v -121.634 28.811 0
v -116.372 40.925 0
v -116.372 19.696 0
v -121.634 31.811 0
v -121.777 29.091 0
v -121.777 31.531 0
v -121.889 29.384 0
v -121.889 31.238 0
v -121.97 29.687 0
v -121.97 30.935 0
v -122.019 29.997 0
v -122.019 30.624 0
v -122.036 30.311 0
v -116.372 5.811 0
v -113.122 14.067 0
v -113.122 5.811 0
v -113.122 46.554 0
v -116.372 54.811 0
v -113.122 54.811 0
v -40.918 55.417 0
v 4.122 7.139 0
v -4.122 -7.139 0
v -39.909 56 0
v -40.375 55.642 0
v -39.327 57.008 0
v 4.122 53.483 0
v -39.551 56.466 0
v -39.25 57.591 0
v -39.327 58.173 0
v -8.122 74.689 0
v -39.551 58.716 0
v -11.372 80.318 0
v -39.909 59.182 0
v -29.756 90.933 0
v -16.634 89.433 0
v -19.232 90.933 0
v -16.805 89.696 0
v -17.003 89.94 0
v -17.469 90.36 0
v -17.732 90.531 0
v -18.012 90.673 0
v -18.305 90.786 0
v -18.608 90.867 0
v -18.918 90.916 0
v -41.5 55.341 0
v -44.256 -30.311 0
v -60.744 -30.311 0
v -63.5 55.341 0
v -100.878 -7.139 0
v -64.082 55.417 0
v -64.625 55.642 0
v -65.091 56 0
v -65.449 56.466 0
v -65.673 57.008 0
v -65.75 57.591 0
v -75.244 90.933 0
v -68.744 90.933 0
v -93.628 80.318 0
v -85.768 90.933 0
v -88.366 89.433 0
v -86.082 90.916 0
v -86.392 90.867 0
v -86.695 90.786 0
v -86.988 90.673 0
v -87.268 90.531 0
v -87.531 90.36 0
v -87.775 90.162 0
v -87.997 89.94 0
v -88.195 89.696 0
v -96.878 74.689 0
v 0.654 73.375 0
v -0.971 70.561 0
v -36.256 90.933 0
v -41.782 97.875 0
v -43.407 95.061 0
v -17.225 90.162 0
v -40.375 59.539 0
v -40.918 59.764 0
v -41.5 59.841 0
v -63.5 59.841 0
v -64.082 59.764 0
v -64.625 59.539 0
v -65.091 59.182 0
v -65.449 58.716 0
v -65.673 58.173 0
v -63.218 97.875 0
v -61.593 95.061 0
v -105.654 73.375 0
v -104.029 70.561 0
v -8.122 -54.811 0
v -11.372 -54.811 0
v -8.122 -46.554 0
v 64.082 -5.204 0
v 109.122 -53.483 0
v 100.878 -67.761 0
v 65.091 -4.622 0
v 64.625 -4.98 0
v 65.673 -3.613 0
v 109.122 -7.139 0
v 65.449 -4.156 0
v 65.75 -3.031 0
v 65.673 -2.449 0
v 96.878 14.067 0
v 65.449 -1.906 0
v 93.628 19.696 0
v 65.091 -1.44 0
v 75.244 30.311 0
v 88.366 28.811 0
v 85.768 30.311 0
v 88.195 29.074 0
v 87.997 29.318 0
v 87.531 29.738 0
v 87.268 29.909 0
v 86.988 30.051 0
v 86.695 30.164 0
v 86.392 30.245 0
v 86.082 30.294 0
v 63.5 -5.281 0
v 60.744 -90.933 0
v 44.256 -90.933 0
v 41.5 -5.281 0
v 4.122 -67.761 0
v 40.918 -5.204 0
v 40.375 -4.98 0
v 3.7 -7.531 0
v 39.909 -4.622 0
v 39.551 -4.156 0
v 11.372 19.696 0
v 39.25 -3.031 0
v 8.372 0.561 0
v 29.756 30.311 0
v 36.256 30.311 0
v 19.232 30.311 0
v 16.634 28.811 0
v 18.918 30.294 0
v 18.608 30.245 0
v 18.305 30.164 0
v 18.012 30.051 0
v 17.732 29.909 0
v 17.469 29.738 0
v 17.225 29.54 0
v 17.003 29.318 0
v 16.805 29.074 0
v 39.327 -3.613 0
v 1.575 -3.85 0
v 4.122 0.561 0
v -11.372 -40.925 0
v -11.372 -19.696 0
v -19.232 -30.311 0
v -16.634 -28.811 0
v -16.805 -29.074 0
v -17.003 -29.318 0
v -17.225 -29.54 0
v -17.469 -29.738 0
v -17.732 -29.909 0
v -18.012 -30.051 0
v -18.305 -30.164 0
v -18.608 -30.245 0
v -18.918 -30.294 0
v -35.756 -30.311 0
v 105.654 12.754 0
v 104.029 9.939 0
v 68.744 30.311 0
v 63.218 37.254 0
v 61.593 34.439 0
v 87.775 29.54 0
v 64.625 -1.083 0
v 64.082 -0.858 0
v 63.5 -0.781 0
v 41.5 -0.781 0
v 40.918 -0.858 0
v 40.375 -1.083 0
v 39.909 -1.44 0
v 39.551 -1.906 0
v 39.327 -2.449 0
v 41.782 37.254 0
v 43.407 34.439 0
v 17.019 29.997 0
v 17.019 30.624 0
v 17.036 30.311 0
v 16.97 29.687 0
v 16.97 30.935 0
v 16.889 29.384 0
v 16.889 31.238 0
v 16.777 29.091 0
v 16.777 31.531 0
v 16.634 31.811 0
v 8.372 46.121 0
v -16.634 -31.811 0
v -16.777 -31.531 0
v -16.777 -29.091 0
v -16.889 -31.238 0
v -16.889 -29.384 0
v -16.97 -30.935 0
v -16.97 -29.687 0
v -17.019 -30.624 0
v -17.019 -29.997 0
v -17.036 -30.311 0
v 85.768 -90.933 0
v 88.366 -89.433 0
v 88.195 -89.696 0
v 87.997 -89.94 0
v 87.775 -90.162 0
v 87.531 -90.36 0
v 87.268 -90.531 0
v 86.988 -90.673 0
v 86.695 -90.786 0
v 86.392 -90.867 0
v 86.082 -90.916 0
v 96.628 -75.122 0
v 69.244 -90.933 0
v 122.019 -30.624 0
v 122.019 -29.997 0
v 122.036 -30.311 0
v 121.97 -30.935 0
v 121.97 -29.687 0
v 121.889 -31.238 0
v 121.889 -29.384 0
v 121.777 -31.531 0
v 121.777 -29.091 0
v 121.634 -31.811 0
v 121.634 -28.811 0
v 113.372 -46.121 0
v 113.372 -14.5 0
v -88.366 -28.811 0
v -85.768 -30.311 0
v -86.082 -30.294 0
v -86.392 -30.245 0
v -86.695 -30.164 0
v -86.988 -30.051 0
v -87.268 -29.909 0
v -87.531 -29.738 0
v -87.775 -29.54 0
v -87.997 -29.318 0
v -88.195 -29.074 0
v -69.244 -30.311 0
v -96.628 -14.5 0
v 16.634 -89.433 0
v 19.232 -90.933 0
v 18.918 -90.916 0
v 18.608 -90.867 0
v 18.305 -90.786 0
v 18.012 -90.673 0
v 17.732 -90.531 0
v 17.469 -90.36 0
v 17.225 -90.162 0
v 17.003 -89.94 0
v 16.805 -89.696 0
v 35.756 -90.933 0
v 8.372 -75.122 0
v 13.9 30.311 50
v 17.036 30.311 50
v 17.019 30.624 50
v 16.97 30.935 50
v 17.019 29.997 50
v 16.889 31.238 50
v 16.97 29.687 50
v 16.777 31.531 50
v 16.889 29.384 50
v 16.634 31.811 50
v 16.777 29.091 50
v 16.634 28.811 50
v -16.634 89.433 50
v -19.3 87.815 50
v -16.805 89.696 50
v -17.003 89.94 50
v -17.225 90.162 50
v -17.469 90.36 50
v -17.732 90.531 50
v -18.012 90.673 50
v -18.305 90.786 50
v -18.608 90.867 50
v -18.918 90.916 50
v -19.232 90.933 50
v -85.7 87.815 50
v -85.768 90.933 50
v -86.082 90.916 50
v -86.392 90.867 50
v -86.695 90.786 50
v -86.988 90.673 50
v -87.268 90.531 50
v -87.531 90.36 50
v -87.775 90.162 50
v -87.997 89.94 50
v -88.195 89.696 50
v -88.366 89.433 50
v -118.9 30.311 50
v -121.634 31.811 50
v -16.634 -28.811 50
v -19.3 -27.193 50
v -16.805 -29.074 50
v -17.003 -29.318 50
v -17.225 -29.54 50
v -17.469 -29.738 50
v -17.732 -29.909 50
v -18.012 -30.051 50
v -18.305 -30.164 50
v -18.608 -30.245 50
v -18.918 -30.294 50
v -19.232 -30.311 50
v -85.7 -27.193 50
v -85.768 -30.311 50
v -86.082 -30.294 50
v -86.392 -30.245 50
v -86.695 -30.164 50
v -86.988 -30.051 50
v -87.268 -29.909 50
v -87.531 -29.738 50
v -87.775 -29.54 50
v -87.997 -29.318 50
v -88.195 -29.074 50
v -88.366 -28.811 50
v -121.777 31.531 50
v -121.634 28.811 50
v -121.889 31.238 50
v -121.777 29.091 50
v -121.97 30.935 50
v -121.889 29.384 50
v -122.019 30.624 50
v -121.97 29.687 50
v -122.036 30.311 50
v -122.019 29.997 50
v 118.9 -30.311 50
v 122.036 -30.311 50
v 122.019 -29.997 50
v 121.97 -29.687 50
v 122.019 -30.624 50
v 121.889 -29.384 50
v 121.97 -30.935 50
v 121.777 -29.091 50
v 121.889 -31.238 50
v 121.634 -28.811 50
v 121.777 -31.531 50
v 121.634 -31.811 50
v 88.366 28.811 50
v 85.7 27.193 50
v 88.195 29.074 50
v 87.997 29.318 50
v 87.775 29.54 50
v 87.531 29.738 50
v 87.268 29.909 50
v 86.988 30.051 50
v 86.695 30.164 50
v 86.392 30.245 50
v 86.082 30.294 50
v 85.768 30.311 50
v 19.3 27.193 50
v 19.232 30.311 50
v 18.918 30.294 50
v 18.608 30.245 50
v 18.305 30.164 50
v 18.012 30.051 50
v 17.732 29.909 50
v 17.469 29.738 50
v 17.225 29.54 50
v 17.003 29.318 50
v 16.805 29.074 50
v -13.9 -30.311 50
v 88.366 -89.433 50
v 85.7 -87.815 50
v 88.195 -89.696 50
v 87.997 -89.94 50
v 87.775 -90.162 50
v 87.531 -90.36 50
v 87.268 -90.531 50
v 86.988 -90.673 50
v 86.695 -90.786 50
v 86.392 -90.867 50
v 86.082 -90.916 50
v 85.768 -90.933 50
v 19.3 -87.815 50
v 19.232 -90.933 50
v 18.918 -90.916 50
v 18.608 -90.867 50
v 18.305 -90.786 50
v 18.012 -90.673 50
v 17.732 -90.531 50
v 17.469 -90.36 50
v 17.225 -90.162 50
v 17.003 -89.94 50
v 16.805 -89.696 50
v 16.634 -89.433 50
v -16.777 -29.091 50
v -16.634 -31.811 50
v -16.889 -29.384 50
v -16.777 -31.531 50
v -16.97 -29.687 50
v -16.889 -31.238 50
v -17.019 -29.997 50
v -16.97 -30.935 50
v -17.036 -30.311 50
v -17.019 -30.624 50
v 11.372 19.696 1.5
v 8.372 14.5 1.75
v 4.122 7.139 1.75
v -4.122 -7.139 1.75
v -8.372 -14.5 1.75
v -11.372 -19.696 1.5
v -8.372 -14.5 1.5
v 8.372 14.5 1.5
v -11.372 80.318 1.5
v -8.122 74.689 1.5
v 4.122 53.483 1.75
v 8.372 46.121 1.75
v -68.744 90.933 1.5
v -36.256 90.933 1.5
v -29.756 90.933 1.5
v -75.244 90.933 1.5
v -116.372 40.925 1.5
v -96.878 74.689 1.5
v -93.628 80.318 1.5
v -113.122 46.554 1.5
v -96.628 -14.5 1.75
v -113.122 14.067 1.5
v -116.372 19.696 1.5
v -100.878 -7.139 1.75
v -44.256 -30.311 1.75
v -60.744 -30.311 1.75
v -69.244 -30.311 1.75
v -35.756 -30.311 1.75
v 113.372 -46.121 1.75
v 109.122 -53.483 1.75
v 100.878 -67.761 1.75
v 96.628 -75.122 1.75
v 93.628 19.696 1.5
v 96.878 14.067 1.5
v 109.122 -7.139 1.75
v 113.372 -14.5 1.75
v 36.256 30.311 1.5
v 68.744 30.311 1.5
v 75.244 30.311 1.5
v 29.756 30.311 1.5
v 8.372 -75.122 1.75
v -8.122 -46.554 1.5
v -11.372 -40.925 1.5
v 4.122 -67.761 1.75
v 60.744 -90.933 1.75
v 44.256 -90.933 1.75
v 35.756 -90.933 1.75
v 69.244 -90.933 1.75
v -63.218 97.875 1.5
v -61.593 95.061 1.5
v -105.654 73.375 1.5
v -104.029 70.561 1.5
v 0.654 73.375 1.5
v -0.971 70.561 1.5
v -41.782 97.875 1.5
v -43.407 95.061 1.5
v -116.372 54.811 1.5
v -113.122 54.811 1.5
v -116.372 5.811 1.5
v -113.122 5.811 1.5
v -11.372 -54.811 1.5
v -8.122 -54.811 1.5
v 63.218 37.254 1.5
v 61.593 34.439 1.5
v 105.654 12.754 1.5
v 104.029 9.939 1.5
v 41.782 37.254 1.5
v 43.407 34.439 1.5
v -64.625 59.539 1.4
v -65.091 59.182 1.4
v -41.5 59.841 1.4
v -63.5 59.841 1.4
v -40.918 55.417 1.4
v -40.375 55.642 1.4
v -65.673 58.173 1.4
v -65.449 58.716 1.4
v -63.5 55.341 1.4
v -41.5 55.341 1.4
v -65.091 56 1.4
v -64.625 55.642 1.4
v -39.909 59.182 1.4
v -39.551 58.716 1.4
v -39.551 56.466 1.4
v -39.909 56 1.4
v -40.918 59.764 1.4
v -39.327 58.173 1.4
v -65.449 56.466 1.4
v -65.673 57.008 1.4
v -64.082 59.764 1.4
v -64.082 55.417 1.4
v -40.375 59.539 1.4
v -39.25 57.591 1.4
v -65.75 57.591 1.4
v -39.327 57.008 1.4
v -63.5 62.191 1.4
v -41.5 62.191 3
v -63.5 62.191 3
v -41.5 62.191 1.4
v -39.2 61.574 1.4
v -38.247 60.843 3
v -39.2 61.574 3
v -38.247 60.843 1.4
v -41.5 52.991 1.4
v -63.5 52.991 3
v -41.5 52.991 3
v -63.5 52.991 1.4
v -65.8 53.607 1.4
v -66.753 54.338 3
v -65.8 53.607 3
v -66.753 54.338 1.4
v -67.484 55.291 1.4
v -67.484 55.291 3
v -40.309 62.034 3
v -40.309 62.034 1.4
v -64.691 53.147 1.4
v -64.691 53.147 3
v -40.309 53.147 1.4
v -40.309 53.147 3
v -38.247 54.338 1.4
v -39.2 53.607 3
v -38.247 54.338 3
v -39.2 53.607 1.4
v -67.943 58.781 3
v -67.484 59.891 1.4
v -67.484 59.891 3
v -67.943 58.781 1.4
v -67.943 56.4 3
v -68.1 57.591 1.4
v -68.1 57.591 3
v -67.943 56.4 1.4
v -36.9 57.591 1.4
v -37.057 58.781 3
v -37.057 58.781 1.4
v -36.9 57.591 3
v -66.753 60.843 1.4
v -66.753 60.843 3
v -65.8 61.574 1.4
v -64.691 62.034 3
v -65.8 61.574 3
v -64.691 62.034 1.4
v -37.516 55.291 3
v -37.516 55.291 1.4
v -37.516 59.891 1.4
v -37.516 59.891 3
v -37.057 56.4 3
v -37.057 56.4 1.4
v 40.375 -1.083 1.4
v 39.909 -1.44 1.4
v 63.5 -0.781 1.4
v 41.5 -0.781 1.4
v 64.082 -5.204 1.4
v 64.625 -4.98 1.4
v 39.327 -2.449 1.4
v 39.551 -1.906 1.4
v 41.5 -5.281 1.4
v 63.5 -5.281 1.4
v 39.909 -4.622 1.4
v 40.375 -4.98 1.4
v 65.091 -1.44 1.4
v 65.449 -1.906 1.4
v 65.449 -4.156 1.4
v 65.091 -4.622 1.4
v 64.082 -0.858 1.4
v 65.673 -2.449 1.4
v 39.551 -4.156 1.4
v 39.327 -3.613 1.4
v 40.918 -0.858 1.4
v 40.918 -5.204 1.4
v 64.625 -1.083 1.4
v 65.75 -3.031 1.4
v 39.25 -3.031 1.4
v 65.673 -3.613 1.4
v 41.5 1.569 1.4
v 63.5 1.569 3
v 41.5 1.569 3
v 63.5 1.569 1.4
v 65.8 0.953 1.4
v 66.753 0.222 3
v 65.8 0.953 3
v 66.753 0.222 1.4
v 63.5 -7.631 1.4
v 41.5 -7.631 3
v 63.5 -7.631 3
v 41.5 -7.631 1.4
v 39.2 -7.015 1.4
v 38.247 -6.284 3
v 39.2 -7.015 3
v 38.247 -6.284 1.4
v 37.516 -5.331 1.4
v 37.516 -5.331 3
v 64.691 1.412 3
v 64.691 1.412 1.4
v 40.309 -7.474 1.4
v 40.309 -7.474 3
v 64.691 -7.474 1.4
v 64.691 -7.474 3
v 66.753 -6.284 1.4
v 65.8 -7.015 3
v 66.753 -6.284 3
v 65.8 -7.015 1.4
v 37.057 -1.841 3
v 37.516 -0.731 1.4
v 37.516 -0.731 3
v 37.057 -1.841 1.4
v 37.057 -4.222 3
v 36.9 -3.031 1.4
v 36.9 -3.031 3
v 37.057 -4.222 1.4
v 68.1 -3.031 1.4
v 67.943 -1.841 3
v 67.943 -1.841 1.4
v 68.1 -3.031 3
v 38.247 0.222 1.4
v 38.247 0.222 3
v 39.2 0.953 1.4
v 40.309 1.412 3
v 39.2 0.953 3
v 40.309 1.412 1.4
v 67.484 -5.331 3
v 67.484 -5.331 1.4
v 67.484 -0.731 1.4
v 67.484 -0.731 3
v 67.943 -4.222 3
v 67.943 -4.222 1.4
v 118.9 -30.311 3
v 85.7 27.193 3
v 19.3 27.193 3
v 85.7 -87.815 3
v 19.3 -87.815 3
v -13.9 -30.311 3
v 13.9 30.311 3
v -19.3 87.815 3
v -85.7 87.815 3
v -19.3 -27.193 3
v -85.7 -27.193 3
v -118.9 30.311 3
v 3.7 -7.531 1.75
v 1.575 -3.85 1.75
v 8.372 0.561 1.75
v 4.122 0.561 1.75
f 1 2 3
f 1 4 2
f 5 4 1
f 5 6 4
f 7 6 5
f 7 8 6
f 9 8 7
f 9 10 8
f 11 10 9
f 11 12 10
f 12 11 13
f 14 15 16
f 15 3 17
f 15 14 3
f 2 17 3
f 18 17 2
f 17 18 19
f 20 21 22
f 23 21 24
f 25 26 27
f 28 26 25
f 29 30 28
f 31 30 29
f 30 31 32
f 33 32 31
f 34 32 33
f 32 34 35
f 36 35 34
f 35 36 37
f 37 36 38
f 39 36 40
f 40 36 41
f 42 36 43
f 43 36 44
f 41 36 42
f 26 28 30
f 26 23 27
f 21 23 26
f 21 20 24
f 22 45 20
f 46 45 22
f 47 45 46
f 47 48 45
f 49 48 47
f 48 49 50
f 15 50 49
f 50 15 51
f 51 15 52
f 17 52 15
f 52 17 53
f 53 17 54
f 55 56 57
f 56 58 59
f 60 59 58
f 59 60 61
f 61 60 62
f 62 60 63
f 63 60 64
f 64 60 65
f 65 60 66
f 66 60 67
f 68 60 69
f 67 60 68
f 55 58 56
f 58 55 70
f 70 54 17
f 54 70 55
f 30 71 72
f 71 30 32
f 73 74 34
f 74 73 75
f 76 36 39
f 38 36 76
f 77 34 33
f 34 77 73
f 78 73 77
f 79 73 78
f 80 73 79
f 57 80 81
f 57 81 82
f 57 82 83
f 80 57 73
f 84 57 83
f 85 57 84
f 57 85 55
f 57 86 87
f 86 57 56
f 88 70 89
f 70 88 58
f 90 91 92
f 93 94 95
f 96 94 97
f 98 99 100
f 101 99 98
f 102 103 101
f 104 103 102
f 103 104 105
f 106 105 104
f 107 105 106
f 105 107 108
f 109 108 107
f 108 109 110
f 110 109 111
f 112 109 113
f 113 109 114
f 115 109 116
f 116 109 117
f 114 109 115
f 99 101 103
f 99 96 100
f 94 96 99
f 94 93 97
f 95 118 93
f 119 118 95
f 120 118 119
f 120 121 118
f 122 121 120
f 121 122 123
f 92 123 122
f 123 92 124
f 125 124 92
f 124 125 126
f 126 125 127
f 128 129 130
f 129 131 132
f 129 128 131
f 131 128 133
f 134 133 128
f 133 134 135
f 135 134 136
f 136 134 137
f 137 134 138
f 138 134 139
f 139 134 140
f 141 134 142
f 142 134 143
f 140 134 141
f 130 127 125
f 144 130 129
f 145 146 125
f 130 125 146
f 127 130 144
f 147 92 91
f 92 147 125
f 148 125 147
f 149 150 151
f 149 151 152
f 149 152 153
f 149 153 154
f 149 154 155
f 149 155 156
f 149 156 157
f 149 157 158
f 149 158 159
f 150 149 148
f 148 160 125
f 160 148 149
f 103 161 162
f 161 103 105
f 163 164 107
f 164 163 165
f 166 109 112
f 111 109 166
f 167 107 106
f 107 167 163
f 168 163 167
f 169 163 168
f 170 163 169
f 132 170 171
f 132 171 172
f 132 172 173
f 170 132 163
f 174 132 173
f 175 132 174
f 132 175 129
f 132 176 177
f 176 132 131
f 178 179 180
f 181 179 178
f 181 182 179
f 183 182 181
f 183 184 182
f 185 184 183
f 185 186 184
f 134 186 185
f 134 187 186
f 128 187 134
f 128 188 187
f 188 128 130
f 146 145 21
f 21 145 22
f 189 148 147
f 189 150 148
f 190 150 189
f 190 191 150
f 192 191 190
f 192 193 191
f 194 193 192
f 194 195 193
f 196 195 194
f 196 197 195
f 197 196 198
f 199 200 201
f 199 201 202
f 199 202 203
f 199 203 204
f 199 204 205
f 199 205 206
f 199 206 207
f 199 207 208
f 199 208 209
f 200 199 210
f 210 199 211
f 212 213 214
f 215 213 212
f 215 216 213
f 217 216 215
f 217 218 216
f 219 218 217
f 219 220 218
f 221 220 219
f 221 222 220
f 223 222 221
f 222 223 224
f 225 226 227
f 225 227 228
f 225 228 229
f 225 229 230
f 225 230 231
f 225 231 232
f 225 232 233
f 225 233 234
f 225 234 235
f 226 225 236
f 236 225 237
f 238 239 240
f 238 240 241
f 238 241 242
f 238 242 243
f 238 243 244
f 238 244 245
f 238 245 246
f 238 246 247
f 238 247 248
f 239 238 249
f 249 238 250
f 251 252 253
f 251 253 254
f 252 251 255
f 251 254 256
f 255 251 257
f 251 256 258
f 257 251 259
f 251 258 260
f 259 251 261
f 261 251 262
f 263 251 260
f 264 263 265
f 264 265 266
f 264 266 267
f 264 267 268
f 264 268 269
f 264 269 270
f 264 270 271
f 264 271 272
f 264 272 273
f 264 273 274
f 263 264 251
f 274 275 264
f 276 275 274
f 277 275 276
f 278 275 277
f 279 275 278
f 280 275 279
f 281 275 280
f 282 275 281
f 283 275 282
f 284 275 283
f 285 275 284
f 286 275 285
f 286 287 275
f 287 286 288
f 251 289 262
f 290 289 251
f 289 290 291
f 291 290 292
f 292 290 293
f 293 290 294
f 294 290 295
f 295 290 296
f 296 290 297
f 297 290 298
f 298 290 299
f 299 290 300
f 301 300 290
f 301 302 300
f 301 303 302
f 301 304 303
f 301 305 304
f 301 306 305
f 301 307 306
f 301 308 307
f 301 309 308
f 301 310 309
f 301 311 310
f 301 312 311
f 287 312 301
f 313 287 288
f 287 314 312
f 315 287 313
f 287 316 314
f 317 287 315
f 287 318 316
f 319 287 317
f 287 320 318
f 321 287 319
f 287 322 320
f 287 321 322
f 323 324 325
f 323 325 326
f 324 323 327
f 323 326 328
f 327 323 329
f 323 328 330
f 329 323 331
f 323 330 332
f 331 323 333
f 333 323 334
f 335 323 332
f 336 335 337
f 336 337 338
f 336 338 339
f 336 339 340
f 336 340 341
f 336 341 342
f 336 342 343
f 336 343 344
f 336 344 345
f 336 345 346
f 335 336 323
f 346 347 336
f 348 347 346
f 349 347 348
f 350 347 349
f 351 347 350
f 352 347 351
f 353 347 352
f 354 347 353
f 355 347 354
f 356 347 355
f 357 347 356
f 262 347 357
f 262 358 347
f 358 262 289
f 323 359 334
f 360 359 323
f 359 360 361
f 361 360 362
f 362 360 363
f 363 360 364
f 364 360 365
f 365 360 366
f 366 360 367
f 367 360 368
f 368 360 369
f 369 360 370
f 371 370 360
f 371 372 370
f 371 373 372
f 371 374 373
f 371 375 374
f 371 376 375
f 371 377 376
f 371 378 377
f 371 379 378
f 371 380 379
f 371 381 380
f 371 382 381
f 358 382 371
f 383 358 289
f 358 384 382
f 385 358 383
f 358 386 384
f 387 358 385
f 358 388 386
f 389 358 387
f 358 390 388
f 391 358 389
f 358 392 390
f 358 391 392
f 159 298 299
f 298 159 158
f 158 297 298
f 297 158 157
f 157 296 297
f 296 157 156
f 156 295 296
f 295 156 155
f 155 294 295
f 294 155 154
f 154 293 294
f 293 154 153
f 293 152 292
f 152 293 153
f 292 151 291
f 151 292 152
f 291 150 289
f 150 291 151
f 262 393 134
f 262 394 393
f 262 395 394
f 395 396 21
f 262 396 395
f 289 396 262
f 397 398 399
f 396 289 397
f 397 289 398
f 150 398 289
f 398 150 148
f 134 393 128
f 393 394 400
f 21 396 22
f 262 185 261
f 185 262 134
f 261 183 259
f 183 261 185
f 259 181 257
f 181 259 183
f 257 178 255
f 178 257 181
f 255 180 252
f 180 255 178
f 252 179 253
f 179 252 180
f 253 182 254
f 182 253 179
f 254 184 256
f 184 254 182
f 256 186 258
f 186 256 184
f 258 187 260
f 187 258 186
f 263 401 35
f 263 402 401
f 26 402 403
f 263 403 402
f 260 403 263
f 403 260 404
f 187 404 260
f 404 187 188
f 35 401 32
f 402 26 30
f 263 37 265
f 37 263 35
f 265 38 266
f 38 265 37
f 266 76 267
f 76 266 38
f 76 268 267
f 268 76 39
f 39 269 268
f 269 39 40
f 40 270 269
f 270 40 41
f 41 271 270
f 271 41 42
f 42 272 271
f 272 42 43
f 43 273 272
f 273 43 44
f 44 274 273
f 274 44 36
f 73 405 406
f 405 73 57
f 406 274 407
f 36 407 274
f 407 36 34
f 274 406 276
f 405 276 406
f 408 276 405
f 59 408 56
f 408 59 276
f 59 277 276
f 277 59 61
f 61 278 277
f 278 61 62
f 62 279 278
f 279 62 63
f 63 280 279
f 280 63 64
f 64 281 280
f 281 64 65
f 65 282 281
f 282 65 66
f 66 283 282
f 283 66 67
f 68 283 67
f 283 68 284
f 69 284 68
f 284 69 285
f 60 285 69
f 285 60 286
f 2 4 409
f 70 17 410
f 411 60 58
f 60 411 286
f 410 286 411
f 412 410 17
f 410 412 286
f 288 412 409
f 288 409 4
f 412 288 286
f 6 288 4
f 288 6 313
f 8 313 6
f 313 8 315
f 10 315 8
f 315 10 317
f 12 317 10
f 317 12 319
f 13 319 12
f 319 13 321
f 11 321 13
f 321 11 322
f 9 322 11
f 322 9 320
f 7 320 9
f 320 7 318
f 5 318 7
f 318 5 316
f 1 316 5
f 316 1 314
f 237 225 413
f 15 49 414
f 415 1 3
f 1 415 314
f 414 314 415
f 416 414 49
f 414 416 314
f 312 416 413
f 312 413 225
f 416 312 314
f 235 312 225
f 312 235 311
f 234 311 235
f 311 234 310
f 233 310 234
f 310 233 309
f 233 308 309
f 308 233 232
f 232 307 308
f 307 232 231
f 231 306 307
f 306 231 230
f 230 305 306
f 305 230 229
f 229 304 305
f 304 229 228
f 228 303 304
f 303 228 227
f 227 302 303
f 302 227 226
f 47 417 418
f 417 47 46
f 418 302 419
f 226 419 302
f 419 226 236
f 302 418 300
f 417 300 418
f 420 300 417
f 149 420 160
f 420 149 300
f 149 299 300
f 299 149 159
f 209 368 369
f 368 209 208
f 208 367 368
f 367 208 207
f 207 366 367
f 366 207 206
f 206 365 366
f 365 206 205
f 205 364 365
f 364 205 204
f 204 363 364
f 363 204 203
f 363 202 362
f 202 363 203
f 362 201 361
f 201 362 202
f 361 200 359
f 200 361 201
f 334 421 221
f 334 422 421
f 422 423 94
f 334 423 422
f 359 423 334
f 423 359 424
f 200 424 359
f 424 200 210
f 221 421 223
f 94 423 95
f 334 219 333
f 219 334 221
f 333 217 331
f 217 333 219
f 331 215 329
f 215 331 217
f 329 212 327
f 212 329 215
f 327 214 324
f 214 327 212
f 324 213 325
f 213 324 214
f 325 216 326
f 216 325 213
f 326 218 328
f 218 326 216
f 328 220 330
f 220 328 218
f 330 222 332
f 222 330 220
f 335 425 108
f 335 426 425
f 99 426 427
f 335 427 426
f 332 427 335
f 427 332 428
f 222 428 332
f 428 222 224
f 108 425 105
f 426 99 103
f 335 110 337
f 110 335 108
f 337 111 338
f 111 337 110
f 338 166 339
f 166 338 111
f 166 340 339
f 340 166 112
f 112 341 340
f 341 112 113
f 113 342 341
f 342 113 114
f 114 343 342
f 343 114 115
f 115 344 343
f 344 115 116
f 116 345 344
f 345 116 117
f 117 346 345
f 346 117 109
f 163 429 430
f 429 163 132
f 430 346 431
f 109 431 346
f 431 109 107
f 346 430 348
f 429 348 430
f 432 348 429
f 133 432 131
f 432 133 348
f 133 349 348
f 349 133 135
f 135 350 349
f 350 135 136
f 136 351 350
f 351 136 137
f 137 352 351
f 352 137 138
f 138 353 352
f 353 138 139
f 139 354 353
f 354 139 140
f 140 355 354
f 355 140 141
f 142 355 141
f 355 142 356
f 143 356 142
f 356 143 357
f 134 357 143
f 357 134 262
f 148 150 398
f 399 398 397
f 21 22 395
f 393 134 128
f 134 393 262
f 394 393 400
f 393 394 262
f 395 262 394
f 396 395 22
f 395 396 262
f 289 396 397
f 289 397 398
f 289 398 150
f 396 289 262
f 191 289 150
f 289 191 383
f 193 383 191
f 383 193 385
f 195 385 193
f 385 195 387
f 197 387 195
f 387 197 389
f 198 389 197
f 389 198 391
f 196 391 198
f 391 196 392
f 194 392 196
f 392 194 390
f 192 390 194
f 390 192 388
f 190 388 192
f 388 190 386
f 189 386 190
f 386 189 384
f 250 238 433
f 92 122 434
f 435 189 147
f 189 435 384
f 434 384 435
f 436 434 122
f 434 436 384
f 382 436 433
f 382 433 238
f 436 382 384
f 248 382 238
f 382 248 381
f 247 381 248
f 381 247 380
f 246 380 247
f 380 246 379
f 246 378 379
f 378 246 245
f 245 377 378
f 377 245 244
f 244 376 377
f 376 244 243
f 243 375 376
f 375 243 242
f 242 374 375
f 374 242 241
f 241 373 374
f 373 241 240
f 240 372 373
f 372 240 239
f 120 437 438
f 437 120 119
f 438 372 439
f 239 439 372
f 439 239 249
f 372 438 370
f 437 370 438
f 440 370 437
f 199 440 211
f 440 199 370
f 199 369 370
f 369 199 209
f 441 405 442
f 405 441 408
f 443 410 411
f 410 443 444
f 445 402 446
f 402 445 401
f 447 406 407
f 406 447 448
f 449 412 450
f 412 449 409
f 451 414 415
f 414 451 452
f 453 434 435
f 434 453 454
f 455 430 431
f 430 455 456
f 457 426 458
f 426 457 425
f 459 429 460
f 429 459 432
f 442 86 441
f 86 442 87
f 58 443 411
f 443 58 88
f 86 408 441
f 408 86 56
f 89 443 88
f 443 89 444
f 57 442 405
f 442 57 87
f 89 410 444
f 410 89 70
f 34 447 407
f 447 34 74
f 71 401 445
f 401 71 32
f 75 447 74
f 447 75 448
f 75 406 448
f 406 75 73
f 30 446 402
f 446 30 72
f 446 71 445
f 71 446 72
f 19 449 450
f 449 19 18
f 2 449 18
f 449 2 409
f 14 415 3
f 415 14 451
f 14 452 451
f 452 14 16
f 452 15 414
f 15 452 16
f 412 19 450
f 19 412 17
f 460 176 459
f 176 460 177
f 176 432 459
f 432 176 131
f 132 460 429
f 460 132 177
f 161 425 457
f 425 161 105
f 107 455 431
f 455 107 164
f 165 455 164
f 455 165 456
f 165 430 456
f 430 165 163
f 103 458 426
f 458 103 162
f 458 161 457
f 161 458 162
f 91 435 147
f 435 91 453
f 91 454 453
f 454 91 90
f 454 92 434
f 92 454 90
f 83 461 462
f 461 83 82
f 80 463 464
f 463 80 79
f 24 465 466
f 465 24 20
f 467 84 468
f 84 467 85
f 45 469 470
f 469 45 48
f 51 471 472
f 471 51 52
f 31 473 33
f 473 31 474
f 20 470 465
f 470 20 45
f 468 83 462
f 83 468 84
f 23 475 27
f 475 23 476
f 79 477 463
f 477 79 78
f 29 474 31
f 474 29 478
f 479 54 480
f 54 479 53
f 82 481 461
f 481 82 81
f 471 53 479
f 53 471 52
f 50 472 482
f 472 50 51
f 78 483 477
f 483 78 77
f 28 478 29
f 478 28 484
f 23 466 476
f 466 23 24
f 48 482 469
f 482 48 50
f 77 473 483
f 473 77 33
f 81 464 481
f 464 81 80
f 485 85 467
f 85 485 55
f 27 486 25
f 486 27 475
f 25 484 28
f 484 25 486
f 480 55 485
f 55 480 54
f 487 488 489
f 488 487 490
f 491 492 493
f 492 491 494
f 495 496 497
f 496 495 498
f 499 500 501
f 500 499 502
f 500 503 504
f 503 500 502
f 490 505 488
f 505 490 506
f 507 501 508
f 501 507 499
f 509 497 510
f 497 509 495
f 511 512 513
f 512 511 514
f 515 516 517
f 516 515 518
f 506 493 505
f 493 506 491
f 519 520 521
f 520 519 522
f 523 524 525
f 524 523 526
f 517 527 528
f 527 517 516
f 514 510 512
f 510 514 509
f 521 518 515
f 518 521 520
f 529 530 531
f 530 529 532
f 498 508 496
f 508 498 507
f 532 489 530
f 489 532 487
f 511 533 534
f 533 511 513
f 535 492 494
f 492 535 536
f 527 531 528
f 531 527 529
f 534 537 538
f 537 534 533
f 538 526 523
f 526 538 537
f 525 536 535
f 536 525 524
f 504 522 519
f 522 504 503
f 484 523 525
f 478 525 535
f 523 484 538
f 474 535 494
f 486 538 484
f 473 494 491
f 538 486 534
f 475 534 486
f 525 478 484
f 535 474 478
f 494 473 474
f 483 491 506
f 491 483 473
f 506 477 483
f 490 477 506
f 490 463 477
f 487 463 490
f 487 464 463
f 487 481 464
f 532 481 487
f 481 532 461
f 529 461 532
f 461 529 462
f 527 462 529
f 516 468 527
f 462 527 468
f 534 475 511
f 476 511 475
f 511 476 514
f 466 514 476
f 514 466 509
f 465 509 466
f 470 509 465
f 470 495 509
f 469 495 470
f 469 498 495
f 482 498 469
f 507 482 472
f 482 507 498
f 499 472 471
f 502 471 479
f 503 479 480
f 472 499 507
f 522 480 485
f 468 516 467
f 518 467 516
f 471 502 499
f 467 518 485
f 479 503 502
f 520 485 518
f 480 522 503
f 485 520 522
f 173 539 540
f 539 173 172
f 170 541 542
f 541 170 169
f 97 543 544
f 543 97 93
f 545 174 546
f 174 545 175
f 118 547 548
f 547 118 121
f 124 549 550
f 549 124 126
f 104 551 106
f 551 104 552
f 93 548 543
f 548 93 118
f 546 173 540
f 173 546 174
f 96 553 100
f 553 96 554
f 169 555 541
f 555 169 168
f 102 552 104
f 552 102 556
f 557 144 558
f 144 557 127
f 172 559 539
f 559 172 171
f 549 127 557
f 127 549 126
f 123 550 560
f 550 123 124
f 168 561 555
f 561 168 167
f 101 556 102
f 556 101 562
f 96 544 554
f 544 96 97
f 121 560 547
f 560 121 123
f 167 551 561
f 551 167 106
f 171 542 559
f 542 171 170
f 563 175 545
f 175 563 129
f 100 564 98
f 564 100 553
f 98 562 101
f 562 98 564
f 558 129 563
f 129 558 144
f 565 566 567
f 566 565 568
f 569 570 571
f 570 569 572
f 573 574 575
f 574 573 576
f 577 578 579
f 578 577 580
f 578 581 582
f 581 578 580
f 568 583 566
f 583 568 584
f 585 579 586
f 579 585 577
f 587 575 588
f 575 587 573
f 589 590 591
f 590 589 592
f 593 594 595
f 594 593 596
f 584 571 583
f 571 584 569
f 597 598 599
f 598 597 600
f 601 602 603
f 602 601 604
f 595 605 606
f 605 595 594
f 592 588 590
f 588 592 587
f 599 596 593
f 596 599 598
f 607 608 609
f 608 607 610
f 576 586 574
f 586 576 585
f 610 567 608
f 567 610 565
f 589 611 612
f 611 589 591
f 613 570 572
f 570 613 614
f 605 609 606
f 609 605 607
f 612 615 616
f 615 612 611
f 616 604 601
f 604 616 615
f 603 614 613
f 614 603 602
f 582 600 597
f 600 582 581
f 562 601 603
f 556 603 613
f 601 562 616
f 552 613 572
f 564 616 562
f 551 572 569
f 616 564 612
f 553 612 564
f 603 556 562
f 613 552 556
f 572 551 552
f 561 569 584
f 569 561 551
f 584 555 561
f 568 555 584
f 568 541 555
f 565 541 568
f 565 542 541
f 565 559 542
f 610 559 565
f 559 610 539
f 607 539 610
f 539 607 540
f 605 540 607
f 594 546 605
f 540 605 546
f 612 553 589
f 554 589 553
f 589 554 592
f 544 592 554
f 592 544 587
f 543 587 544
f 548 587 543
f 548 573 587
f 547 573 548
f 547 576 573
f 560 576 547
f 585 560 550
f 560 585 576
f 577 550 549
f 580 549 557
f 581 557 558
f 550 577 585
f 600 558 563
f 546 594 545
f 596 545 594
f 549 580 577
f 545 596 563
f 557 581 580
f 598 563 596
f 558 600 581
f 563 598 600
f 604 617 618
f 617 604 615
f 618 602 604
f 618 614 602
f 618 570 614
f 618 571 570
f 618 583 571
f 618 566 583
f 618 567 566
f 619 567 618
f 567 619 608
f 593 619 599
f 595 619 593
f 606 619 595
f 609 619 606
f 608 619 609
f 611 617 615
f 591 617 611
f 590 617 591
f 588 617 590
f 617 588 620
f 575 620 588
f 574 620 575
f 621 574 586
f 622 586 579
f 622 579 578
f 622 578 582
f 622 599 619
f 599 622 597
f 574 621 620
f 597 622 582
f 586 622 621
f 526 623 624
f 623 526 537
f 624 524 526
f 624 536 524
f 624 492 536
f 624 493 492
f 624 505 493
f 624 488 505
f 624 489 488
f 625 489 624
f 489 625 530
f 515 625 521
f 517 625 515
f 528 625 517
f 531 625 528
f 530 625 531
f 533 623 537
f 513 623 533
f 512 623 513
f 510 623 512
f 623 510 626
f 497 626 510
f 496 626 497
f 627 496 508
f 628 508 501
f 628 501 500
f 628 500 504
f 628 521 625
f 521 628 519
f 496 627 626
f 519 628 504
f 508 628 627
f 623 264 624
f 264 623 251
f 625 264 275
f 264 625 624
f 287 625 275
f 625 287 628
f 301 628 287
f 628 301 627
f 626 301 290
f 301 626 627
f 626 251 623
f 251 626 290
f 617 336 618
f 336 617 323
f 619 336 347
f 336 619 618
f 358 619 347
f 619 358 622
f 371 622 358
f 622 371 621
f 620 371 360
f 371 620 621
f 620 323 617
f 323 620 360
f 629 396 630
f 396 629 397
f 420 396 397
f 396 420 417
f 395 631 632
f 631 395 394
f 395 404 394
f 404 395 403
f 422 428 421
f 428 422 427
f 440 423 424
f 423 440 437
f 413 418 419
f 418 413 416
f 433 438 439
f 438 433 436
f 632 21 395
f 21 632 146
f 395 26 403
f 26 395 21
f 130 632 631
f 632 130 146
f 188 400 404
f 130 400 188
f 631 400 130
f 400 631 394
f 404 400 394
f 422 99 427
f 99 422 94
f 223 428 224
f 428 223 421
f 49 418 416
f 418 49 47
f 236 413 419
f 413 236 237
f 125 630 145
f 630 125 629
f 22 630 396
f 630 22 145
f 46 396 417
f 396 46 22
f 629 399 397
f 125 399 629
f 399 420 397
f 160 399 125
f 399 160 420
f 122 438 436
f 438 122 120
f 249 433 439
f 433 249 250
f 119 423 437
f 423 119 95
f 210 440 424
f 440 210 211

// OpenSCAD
/* ==============================================================================
   MODULAR HEXAGONAL WALL SHELVES WITH SOLID BACK & REAR TONGUE-AND-GROOVE
   ==============================================================================
   - Parameterizable 2 or 4 hexagon clusters per module.
   - Solid back wall for maximum rigidity and clean finish.
   - Invisible interlocking: Rear Tongue & Groove + Rear Sliding Dovetails.
     (Front outer faces meet completely flush with ZERO visible connectors).
   - Sized to fit 260mm x 260mm 3D printer build volume.
   - Designed to span 12 feet (144" / 3658mm) wide x 9"+ (229+mm) high.
   - Integrated mounting holes & horizontal adjustment slots for 16" wall studs.
   - Modular presets for 2-hex and 4-hex units, deeper bottom shelves, and full wall visualizer.
   ============================================================================== */

// [RENDER SELECTION]
// Select which component to render
PART_TO_RENDER = "module_2hex"; // [module_2hex:2-Hexagon Module (Duo), module_4hex:4-Hexagon Module (Quad), module_deep_bottom:Deep 2-Hex Bottom Module, screw_plugs:Set of 6 Screw Caps, wall_cleat:French Cleat Wall Bracket, full_wall_preview:Full 12-Foot Wall Preview (Assembly)]

// [CLUSTER CONFIGURATION]
// Number of hexagons per module (2 or 4)
HEX_COUNT = 2; // [2:2 Hexagons (Duo), 4:4 Hexagons (Quad)]

// Cluster arrangement layout
CLUSTER_SHAPE = "vertical_pair"; // [vertical_pair:2-Hex Diagonal (Upper-Left to Bottom-Right), staggered_pair:2-Hex Staggered Diagonal (Bottom-Left to Upper-Right), diamond_quad:4-Hex Diamond 2x2 (Height ~9.5in), t_quad:4-Hex T-Cluster (3 Base + 1 Top), linear_quad:4-Hex Staggered Ribbon]

// [HEXAGON DIMENSIONS]
// Circumradius for 2-Hex module (in mm). 70mm gives 242mm (~9.5in) height, fits 260mm bed.
HEX_RADIUS_2HEX = 70.0; // [50:1:78]

// Circumradius for 4-Hex module (in mm). 56mm gives 242mm (~9.5in) height, fits 260mm bed.
HEX_RADIUS_4HEX = 56.0; // [40:1:62]

// Shelf depth extending from wall (in mm)
SHELF_DEPTH = 50.0; // [60:5:180]

// Depth for deeper lower-tier accent modules (in mm)
DEEP_SHELF_DEPTH = 150.0; // [100:5:220]

// Perimeter and divider wall thickness (in mm)
WALL_THICKNESS = 3.6; // [2.5:0.2:6.0]

// Solid rear back wall thickness (in mm)
BACK_WALL_THICKNESS = 3.0; // [2.0:0.5:6.0]

// Fillet / corner radius on hexagon vertices (in mm)
CORNER_RADIUS = 3.0; // [0:0.5:8]

// [INVISIBLE REAR INTERLOCKING (TONGUE & GROOVE)]
// Type of rear interlocking joint
INTERLOCK_TYPE = "tongue_and_groove"; // [tongue_and_groove:Rear Tongue & Groove Step, rear_dovetail:Sliding Rear Dovetail Tabs, combined:Tongue & Groove + Sliding Dovetails, none:Flat Seamless Edges]

// Width of the rear interlocking tongue lip (in mm)
TONGUE_WIDTH = 3.5; // [2.0:0.5:6.0]

// Clearance tolerance for 3D printing fit (in mm, 0.20-0.30mm recommended)
TOLERANCE = 0.25; // [0.10:0.05:0.50]

// [WALL MOUNTING & 16-INCH STUDS]
// Enable mounting screw holes in the solid back wall
ENABLE_WALL_MOUNTS = true;

// Wall mounting hole style
MOUNT_STYLE = "stud_slot"; // [stud_slot:Horizontal 16in Stud-Adjust Slot, keyhole:Keyhole Slot, countersunk:Countersunk Round Hole]

// Screw shank diameter (in mm, #8 wood screw = 4.2mm, #10 = 4.8mm)
SCREW_SHANK_DIA = 4.5; // [3:0.5:6]

// Screw head diameter for countersink / keyhole (in mm)
SCREW_HEAD_DIA = 9.2; // [7:0.5:12]

// Stud adjustment slot width (in mm, gives horizontal leeway to hit 16" studs)
STUD_SLOT_LENGTH = 22.0; // [10:2:35]

// [WALL ASSEMBLY PREVIEW CONFIGURATION]
// Total wall span length to preview (in feet, default 12)
PREVIEW_WALL_FEET = 12; // [4:1:20]

// Target minimum height (in inches, default 9)
PREVIEW_MIN_HEIGHT_INCHES = 9;

// Stud spacing on wall (in inches, standard 16)
PREVIEW_STUD_SPACING_INCHES = 16;

// Preview layout style
PREVIEW_LAYOUT_STYLE = "staggered_cascade"; // [staggered_cascade:Staggered with Downward Cascades, continuous_band:Continuous 2-Row Band]

// [3D PRINT BED CONSTRAINTS]
BED_MAX_X = 260;
BED_MAX_Y = 260;

$fn = $preview ? 36 : 60;

// ==============================================================================
// ACTIVE DIMENSION RESOLVER & PRINT BED VALIDATION
// ==============================================================================

// Select radius based on module type
ACTIVE_HEX_RADIUS = (PART_TO_RENDER == "module_4hex" || HEX_COUNT == 4) ? HEX_RADIUS_4HEX : HEX_RADIUS_2HEX;
ACTIVE_INRADIUS = ACTIVE_HEX_RADIUS * cos(30);

// Cluster center coordinates based on layout
function get_hex_centers(count = HEX_COUNT, shape = CLUSTER_SHAPE, r = ACTIVE_HEX_RADIUS) = 
    let(
        dy_vert = 2 * r * cos(30),        // vertical step between flat-top hexes
        dx_diag = 1.5 * r,                 // horizontal step
        dy_diag = r * cos(30)              // vertical step for staggered
    )
    (count == 2 && shape == "vertical_pair") ? [
        [-dx_diag / 2, dy_diag / 2],
        [dx_diag / 2, -dy_diag / 2]
    ] :
    (count == 2 && shape == "staggered_pair") ? [
        [-dx_diag / 2, -dy_diag / 2],
        [dx_diag / 2, dy_diag / 2]
    ] :
    (count == 4 && shape == "diamond_quad") ? [
        [-dx_diag / 2, dy_vert / 2],
        [-dx_diag / 2, -dy_vert / 2],
        [dx_diag / 2, dy_vert / 2 + dy_diag],
        [dx_diag / 2, -dy_vert / 2 + dy_diag]
    ] :
    (count == 4 && shape == "t_quad") ? [
        [-dx_diag, -dy_diag],
        [0, 0],
        [dx_diag, -dy_diag],
        [0, dy_vert]
    ] :
    (count == 4 && shape == "linear_quad") ? [
        [-1.5 * dx_diag, -dy_diag / 2],
        [-0.5 * dx_diag, dy_diag / 2],
        [0.5 * dx_diag, -dy_diag / 2],
        [1.5 * dx_diag, dy_diag / 2]
    ] : [
        [-dx_diag / 2, dy_diag / 2],
        [dx_diag / 2, -dy_diag / 2]
    ];

// Calculate bounding box for active cluster
centers = get_hex_centers(HEX_COUNT, CLUSTER_SHAPE, ACTIVE_HEX_RADIUS);
min_x = min([for (c = centers) c[0] - ACTIVE_HEX_RADIUS]);
max_x = max([for (c = centers) c[0] + ACTIVE_HEX_RADIUS]);
min_y = min([for (c = centers) c[1] - ACTIVE_INRADIUS]);
max_y = max([for (c = centers) c[1] + ACTIVE_INRADIUS]);

BBOX_WIDTH = max_x - min_x;
BBOX_HEIGHT = max_y - min_y;

echo("=================================================");
echo(str("CLUSTER CONFIG: ", HEX_COUNT, " Hexagons (Shape: ", CLUSTER_SHAPE, ")"));
echo(str("INDIVIDUAL HEX: Radius = ", ACTIVE_HEX_RADIUS, " mm, Flat-to-Flat = ", round(2 * ACTIVE_INRADIUS * 10)/10, " mm (", round(2 * ACTIVE_INRADIUS / 25.4 * 10)/10, " in)"));
echo(str("MODULE BOUNDING BOX: Width = ", round(BBOX_WIDTH*10)/10, " mm (", round(BBOX_WIDTH/25.4*10)/10, " in), Height = ", round(BBOX_HEIGHT*10)/10, " mm (", round(BBOX_HEIGHT/25.4*10)/10, " in)"));
echo(str("PRINT BED LIMIT: ", BED_MAX_X, " x ", BED_MAX_Y, " mm"));

if (BBOX_WIDTH <= BED_MAX_X && BBOX_HEIGHT <= BED_MAX_Y) {
    echo("STATUS: [PASS] Module fits completely within your 26cm x 26cm print bed!");
} else {
    echo("STATUS: [WARNING] Module exceeds 26cm bed! Rotate 90 deg or decrease hex radius.");
}
echo("=================================================");

// ==============================================================================
// 2D HEXAGON PROFILE FUNCTIONS
// ==============================================================================

module single_hex_2d(r, corner_r = CORNER_RADIUS) {
    if (corner_r > 0) {
        offset(r = corner_r) offset(delta = -corner_r) circle(r = r, $fn = 6);
    } else {
        circle(r = r, $fn = 6);
    }
}

// Full multi-hex cluster outer envelope (2D)
module cluster_outer_2d(count = HEX_COUNT, shape = CLUSTER_SHAPE, r = ACTIVE_HEX_RADIUS) {
    pts = get_hex_centers(count, shape, r);
    union() {
        for (p = pts) {
            translate(p) single_hex_2d(r, CORNER_RADIUS);
        }
    }
}

// Inner open cavities for the cluster (2D)
module cluster_inner_2d(count = HEX_COUNT, shape = CLUSTER_SHAPE, r = ACTIVE_HEX_RADIUS, wall = WALL_THICKNESS) {
    pts = get_hex_centers(count, shape, r);
    union() {
        for (p = pts) {
            translate(p) single_hex_2d(r - wall, max(0, CORNER_RADIUS - wall));
        }
    }
}

// ==============================================================================
// INVISIBLE REAR TONGUE & GROOVE INTERLOCKING
// ==============================================================================

// Outer tongue flange on the rear back wall (extends along boundary)
module rear_tongue_additions_2d(count = HEX_COUNT, shape = CLUSTER_SHAPE, r = ACTIVE_HEX_RADIUS) {
    pts = get_hex_centers(count, shape, r);
    tongue_w = TONGUE_WIDTH - TOLERANCE;
    
    // Add tongue tabs on positive X / top-right perimeter edges
    for (p = pts) {
        translate(p) {
            // For each of the 6 faces, place tongue on faces 0, 1, 5 (right / upper sides)
            for (face = [0, 1, 5]) {
                angle = 30 + 60 * face;
                rotate([0, 0, angle]) {
                    translate([0, r * cos(30) + tongue_w / 2, 0]) {
                        square([r * 0.7, tongue_w], center = true);
                    }
                }
            }
        }
    }
}

// Recessed groove pocket on mating rear edges
module rear_groove_cutouts_2d(count = HEX_COUNT, shape = CLUSTER_SHAPE, r = ACTIVE_HEX_RADIUS) {
    pts = get_hex_centers(count, shape, r);
    groove_w = TONGUE_WIDTH + TOLERANCE;
    
    // Cut groove step on negative X / bottom-left perimeter edges
    for (p = pts) {
        translate(p) {
            // Place groove pockets on faces 2, 3, 4 (left / lower sides)
            for (face = [2, 3, 4]) {
                angle = 30 + 60 * face;
                rotate([0, 0, angle]) {
                    translate([0, r * cos(30) - groove_w / 2, 0]) {
                        square([r * 0.85, groove_w + 0.5], center = true);
                    }
                }
            }
        }
    }
}

// Rear Sliding Dovetail Tab (Male)
module rear_dovetail_male_tab(length = 25, width = 12, depth = 3.5) {
    linear_extrude(height = length) {
        polygon(points = [
            [-width * 0.35, 0],
            [-width / 2, depth],
            [width / 2, depth],
            [width * 0.35, 0]
        ]);
    }
}

// Rear Sliding Dovetail Slot (Female)
module rear_dovetail_female_slot(length = 26, width = 12, depth = 3.5, tol = TOLERANCE) {
    w_wide = width + 2 * tol;
    w_narrow = (width * 0.7) + 2 * tol;
    d = depth + tol;
    
    linear_extrude(height = length + 2) {
        polygon(points = [
            [-w_narrow / 2, -0.1],
            [-w_wide / 2, d],
            [w_wide / 2, d],
            [w_narrow / 2, -0.1]
        ]);
    }
}

// ==============================================================================
// WALL MOUNTING HOLES (KEYHOLES & 16-INCH STUD SLOTS)
// ==============================================================================

module wall_mount_slot(back_thick = BACK_WALL_THICKNESS) {
    if (MOUNT_STYLE == "stud_slot") {
        // Horizontal slot for 16" stud alignment leeway
        union() {
            // Screw shank slot
            hull() {
                translate([-STUD_SLOT_LENGTH / 2, 0, -1]) cylinder(r = SCREW_SHANK_DIA / 2, h = back_thick + 2, $fn = 24);
                translate([STUD_SLOT_LENGTH / 2, 0, -1]) cylinder(r = SCREW_SHANK_DIA / 2, h = back_thick + 2, $fn = 24);
            }
            // Front countersink recess for screw head (inside the shelf cell)
            translate([0, 0, back_thick - 1.6]) {
                hull() {
                    translate([-STUD_SLOT_LENGTH / 2, 0, 0]) cylinder(r = SCREW_HEAD_DIA / 2, h = back_thick, $fn = 24);
                    translate([STUD_SLOT_LENGTH / 2, 0, 0]) cylinder(r = SCREW_HEAD_DIA / 2, h = back_thick, $fn = 24);
                }
            }
        }
    } else if (MOUNT_STYLE == "keyhole") {
        // Teardrop keyhole slot
        union() {
            cylinder(r = SCREW_HEAD_DIA / 2 + 0.3, h = back_thick + 2, center = true, $fn = 28);
            translate([0, 7, 0]) cube([SCREW_SHANK_DIA + 0.2, 14, back_thick + 2], center = true);
            translate([0, 7, -back_thick / 2 + 1.2]) cube([SCREW_HEAD_DIA + 0.8, 14, back_thick], center = true);
        }
    } else {
        // Simple countersunk round hole
        cylinder(r = SCREW_SHANK_DIA / 2, h = back_thick + 2, center = true, $fn = 24);
        translate([0, 0, back_thick / 2 - 1.5]) {
            cylinder(r1 = SCREW_SHANK_DIA / 2, r2 = SCREW_HEAD_DIA / 2, h = 2.0, center = false, $fn = 24);
        }
    }
}

// Cut mounting holes in the solid back wall of selected hex cells
module apply_wall_mount_holes(count = HEX_COUNT, shape = CLUSTER_SHAPE, r = ACTIVE_HEX_RADIUS) {
    pts = get_hex_centers(count, shape, r);
    inrad = r * cos(30);
    
    for (p = pts) {
        // Place mount hole near the upper center of each hexagon
        translate([p[0], p[1] + inrad * 0.45, 0]) {
            wall_mount_slot(BACK_WALL_THICKNESS);
        }
    }
}

// ==============================================================================
// MULTI-HEXAGON SHELF MODULE 3D BUILDER
// ==============================================================================

module modular_hex_shelf(
    count = HEX_COUNT,
    shape = CLUSTER_SHAPE,
    r = ACTIVE_HEX_RADIUS,
    depth_z = SHELF_DEPTH,
    back_thick = BACK_WALL_THICKNESS,
    wall_thick = WALL_THICKNESS,
    with_mounts = ENABLE_WALL_MOUNTS,
    is_deep = false
) {
    actual_depth = is_deep ? DEEP_SHELF_DEPTH : depth_z;
    tongue_thick = back_thick / 2;
    
    difference() {
        union() {
            // 1. Solid Outer Shell & Solid Back Wall
            linear_extrude(height = actual_depth) {
                cluster_outer_2d(count, shape, r);
            }
            
            // 2. Rear Interlocking Tongue Lip (Male tabs on right/top edges)
            if (INTERLOCK_TYPE == "tongue_and_groove" || INTERLOCK_TYPE == "combined") {
                linear_extrude(height = tongue_thick) {
                    rear_tongue_additions_2d(count, shape, r);
                }
            }
            
            // 3. Sliding Rear Dovetail Tabs (if enabled)
            if (INTERLOCK_TYPE == "rear_dovetail" || INTERLOCK_TYPE == "combined") {
                pts = get_hex_centers(count, shape, r);
                for (p = pts) {
                    // Male dovetail tab on right vertical face
                    translate([p[0] + r * cos(30), p[1], 0]) {
                        rotate([0, 0, 90]) rear_dovetail_male_tab(length = actual_depth * 0.6, width = 10, depth = 2.5);
                    }
                }
            }
        }
        
        // 4. Hollow Out Hexagon Interior Compartments (Leaves solid back wall)
        translate([0, 0, back_thick]) {
            linear_extrude(height = actual_depth + 1) {
                cluster_inner_2d(count, shape, r, wall_thick);
            }
        }
        
        // 5. Rear Interlocking Groove Pocket (Female step on left/bottom mating edges)
        if (INTERLOCK_TYPE == "tongue_and_groove" || INTERLOCK_TYPE == "combined") {
            translate([0, 0, -0.5]) {
                linear_extrude(height = tongue_thick + 0.5 + TOLERANCE) {
                    rear_groove_cutouts_2d(count, shape, r);
                }
            }
        }
        
        // 6. Sliding Rear Dovetail Slots on left faces (if enabled)
        if (INTERLOCK_TYPE == "rear_dovetail" || INTERLOCK_TYPE == "combined") {
            pts = get_hex_centers(count, shape, r);
            for (p = pts) {
                translate([p[0] - r * cos(30), p[1], -1]) {
                    rotate([0, 0, -90]) rear_dovetail_female_slot(length = actual_depth * 0.65, width = 10, depth = 2.5);
                }
            }
        }
        
        // 7. Mounting Screw Holes through the Solid Back Wall
        if (with_mounts) {
            apply_wall_mount_holes(count, shape, r);
        }
    }
}

// ==============================================================================
// ACCESSORY MODELS: SCREW PLUGS & CLEATS
// ==============================================================================

// Decorative flush screw cover caps (snap into countersunk holes from front)
module screw_plug_model() {
    cylinder(r = SCREW_HEAD_DIA / 2 - 0.1, h = 1.6, $fn = 32);
    translate([0, 0, 1.6]) {
        cylinder(r1 = SCREW_SHANK_DIA / 2, r2 = SCREW_SHANK_DIA / 2 - 0.2, h = 2.0, $fn = 24);
    }
}

// Batch plate of 6 screw caps
module screw_plugs_batch() {
    echo("Rendering Plate of 6 Flush Screw Covers");
    for (i = [0:2]) {
        for (j = [0:1]) {
            translate([i * (SCREW_HEAD_DIA + 6), j * (SCREW_HEAD_DIA + 6), 0]) {
                screw_plug_model();
            }
        }
    }
}

// French Cleat Wall Mounting Bracket (screws into 16" stud)
module french_cleat_bracket() {
    w = 46;
    h = 24;
    t = 7;
    
    difference() {
        polyhedron(
            points = [
                [-w/2, 0, 0], [w/2, 0, 0], [w/2, h - 5, 0], [-w/2, h - 5, 0],
                [-w/2, 0, t], [w/2, 0, t], [w/2, h, t], [-w/2, h, t]
            ],
            faces = [
                [0,1,2,3], [4,7,6,5], [0,4,5,1], [3,2,6,7], [0,3,7,4], [1,5,6,2]
            ]
        );
        // Countersunk wood screw holes for 16" stud
        for (dx = [-13, 13]) {
            translate([dx, h/2 - 2, -1]) {
                cylinder(r = SCREW_SHANK_DIA / 2, h = t + 2, $fn = 24);
                translate([0, 0, t - 1.8]) {
                    cylinder(r1 = SCREW_SHANK_DIA / 2, r2 = SCREW_HEAD_DIA / 2, h = 2.5, $fn = 24);
                }
            }
        }
    }
}

// ==============================================================================
// 12-FOOT WALL ASSEMBLY VISUALIZER
// ==============================================================================

module full_wall_assembly_visualizer() {
    wall_len_mm = PREVIEW_WALL_FEET * 12 * 25.4;       // 12 ft = 3657.6 mm
    min_ht_mm = PREVIEW_MIN_HEIGHT_INCHES * 25.4;       // 9 in = 228.6 mm
    stud_spacing_mm = PREVIEW_STUD_SPACING_INCHES * 25.4; // 16 in = 406.4 mm
    
    r = (HEX_COUNT == 4) ? HEX_RADIUS_4HEX : HEX_RADIUS_2HEX;
    inrad = r * cos(30);
    dx = 3.0 * r;
    num_modules = ceil(wall_len_mm / dx);
    
    echo("-------------------------------------------------");
    echo(str("WALL PREVIEW: 12 Feet (", wall_len_mm, " mm) Wide x 9+ Inches (", min_ht_mm, " mm) High"));
    echo(str("MODULES ACROSS: ", num_modules, " (", HEX_COUNT, "-Hex modules, Step = ", round(dx*10)/10, " mm)"));
    echo(str("STUD INTERVALS: 16 inches (", stud_spacing_mm, " mm) -> 10 stud locations across 12 ft"));
    echo("-------------------------------------------------");
    
    // 1. Ghosted Reference Box for 12ft x 9in wall coverage
    %translate([wall_len_mm / 2, min_ht_mm / 2, -15]) {
        cube([wall_len_mm, min_ht_mm, 2], center = true);
    }
    
    // 2. Vertical 16-Inch Wall Stud Grid Lines (in Orange)
    for (s = [0 : ceil(wall_len_mm / stud_spacing_mm)]) {
        stud_x = s * stud_spacing_mm;
        if (stud_x <= wall_len_mm + 50) {
            color([1.0, 0.4, 0.1, 0.75]) {
                translate([stud_x, -inrad * 1.5, -8]) {
                    cube([38.1, min_ht_mm * 2.6, 5], center = true); // 1.5" standard 2x4 stud width
                }
            }
        }
    }
    
    // 3. Render Honeycomb Modules Across Wall
    for (m = [0 : num_modules - 1]) {
        mod_x = m * dx;
        dist_to_stud = min([for (s = [0:10]) abs(mod_x - s * stud_spacing_mm)]);
        is_stud_module = (dist_to_stud < (dx / 2 + 10));
        
        // Staggered vertical position
        mod_y = (HEX_COUNT == 4) ? ((m % 2 == 0) ? 0 : (inrad * 1.0)) : 0;
        
        translate([mod_x, mod_y, 0]) {
            if (is_stud_module) {
                // Steel Blue for Modules Anchored to 16" Studs
                color([0.22, 0.48, 0.78, 0.95]) modular_hex_shelf(HEX_COUNT, CLUSTER_SHAPE, r, SHELF_DEPTH, with_mounts = true);
            } else if (m % 3 == 1) {
                // Warm Amber for Accent Modules
                color([0.92, 0.65, 0.22, 0.95]) modular_hex_shelf(HEX_COUNT, CLUSTER_SHAPE, r, SHELF_DEPTH, with_mounts = false);
            } else {
                // Teal for Standard Interlocking Modules
                color([0.18, 0.72, 0.62, 0.95]) modular_hex_shelf(HEX_COUNT, CLUSTER_SHAPE, r, SHELF_DEPTH, with_mounts = false);
            }
        }
        
        // Cascading lower modules (extensions towards the bottom)
        if (PREVIEW_LAYOUT_STYLE == "staggered_cascade") {
            if ((m >= 2 && m <= 5) || (m >= 9 && m <= 13) || (m >= 16 && m <= 19)) {
                lower_y = mod_y - 2 * inrad * 1.0;
                translate([mod_x, lower_y, 0]) {
                    if (m == 3 || m == 11 || m == 17) {
                        // Coral for Deep Lower Shelf Units (extra storage depth)
                        color([0.95, 0.35, 0.35, 0.95]) modular_hex_shelf(HEX_COUNT, CLUSTER_SHAPE, r, DEEP_SHELF_DEPTH, with_mounts = is_stud_module, is_deep = true);
                    } else {
                        color([0.18, 0.72, 0.62, 0.95]) modular_hex_shelf(HEX_COUNT, CLUSTER_SHAPE, r, SHELF_DEPTH, with_mounts = is_stud_module);
                    }
                }
            }
        }
    }
}

// ==============================================================================
// TOP-LEVEL RENDER DISPATCHER
// ==============================================================================

if (PART_TO_RENDER == "module_2hex") {
    modular_hex_shelf(count = 2, shape = "vertical_pair", r = HEX_RADIUS_2HEX, depth_z = SHELF_DEPTH);
} else if (PART_TO_RENDER == "module_4hex") {
    modular_hex_shelf(count = 4, shape = "diamond_quad", r = HEX_RADIUS_4HEX, depth_z = SHELF_DEPTH);
} else if (PART_TO_RENDER == "module_deep_bottom") {
    modular_hex_shelf(count = 2, shape = "vertical_pair", r = HEX_RADIUS_2HEX, depth_z = DEEP_SHELF_DEPTH, is_deep = true);
} else if (PART_TO_RENDER == "screw_plugs") {
    screw_plugs_batch();
} else if (PART_TO_RENDER == "wall_cleat") {
    french_cleat_bracket();
} else if (PART_TO_RENDER == "full_wall_preview") {
    full_wall_assembly_visualizer();
}
